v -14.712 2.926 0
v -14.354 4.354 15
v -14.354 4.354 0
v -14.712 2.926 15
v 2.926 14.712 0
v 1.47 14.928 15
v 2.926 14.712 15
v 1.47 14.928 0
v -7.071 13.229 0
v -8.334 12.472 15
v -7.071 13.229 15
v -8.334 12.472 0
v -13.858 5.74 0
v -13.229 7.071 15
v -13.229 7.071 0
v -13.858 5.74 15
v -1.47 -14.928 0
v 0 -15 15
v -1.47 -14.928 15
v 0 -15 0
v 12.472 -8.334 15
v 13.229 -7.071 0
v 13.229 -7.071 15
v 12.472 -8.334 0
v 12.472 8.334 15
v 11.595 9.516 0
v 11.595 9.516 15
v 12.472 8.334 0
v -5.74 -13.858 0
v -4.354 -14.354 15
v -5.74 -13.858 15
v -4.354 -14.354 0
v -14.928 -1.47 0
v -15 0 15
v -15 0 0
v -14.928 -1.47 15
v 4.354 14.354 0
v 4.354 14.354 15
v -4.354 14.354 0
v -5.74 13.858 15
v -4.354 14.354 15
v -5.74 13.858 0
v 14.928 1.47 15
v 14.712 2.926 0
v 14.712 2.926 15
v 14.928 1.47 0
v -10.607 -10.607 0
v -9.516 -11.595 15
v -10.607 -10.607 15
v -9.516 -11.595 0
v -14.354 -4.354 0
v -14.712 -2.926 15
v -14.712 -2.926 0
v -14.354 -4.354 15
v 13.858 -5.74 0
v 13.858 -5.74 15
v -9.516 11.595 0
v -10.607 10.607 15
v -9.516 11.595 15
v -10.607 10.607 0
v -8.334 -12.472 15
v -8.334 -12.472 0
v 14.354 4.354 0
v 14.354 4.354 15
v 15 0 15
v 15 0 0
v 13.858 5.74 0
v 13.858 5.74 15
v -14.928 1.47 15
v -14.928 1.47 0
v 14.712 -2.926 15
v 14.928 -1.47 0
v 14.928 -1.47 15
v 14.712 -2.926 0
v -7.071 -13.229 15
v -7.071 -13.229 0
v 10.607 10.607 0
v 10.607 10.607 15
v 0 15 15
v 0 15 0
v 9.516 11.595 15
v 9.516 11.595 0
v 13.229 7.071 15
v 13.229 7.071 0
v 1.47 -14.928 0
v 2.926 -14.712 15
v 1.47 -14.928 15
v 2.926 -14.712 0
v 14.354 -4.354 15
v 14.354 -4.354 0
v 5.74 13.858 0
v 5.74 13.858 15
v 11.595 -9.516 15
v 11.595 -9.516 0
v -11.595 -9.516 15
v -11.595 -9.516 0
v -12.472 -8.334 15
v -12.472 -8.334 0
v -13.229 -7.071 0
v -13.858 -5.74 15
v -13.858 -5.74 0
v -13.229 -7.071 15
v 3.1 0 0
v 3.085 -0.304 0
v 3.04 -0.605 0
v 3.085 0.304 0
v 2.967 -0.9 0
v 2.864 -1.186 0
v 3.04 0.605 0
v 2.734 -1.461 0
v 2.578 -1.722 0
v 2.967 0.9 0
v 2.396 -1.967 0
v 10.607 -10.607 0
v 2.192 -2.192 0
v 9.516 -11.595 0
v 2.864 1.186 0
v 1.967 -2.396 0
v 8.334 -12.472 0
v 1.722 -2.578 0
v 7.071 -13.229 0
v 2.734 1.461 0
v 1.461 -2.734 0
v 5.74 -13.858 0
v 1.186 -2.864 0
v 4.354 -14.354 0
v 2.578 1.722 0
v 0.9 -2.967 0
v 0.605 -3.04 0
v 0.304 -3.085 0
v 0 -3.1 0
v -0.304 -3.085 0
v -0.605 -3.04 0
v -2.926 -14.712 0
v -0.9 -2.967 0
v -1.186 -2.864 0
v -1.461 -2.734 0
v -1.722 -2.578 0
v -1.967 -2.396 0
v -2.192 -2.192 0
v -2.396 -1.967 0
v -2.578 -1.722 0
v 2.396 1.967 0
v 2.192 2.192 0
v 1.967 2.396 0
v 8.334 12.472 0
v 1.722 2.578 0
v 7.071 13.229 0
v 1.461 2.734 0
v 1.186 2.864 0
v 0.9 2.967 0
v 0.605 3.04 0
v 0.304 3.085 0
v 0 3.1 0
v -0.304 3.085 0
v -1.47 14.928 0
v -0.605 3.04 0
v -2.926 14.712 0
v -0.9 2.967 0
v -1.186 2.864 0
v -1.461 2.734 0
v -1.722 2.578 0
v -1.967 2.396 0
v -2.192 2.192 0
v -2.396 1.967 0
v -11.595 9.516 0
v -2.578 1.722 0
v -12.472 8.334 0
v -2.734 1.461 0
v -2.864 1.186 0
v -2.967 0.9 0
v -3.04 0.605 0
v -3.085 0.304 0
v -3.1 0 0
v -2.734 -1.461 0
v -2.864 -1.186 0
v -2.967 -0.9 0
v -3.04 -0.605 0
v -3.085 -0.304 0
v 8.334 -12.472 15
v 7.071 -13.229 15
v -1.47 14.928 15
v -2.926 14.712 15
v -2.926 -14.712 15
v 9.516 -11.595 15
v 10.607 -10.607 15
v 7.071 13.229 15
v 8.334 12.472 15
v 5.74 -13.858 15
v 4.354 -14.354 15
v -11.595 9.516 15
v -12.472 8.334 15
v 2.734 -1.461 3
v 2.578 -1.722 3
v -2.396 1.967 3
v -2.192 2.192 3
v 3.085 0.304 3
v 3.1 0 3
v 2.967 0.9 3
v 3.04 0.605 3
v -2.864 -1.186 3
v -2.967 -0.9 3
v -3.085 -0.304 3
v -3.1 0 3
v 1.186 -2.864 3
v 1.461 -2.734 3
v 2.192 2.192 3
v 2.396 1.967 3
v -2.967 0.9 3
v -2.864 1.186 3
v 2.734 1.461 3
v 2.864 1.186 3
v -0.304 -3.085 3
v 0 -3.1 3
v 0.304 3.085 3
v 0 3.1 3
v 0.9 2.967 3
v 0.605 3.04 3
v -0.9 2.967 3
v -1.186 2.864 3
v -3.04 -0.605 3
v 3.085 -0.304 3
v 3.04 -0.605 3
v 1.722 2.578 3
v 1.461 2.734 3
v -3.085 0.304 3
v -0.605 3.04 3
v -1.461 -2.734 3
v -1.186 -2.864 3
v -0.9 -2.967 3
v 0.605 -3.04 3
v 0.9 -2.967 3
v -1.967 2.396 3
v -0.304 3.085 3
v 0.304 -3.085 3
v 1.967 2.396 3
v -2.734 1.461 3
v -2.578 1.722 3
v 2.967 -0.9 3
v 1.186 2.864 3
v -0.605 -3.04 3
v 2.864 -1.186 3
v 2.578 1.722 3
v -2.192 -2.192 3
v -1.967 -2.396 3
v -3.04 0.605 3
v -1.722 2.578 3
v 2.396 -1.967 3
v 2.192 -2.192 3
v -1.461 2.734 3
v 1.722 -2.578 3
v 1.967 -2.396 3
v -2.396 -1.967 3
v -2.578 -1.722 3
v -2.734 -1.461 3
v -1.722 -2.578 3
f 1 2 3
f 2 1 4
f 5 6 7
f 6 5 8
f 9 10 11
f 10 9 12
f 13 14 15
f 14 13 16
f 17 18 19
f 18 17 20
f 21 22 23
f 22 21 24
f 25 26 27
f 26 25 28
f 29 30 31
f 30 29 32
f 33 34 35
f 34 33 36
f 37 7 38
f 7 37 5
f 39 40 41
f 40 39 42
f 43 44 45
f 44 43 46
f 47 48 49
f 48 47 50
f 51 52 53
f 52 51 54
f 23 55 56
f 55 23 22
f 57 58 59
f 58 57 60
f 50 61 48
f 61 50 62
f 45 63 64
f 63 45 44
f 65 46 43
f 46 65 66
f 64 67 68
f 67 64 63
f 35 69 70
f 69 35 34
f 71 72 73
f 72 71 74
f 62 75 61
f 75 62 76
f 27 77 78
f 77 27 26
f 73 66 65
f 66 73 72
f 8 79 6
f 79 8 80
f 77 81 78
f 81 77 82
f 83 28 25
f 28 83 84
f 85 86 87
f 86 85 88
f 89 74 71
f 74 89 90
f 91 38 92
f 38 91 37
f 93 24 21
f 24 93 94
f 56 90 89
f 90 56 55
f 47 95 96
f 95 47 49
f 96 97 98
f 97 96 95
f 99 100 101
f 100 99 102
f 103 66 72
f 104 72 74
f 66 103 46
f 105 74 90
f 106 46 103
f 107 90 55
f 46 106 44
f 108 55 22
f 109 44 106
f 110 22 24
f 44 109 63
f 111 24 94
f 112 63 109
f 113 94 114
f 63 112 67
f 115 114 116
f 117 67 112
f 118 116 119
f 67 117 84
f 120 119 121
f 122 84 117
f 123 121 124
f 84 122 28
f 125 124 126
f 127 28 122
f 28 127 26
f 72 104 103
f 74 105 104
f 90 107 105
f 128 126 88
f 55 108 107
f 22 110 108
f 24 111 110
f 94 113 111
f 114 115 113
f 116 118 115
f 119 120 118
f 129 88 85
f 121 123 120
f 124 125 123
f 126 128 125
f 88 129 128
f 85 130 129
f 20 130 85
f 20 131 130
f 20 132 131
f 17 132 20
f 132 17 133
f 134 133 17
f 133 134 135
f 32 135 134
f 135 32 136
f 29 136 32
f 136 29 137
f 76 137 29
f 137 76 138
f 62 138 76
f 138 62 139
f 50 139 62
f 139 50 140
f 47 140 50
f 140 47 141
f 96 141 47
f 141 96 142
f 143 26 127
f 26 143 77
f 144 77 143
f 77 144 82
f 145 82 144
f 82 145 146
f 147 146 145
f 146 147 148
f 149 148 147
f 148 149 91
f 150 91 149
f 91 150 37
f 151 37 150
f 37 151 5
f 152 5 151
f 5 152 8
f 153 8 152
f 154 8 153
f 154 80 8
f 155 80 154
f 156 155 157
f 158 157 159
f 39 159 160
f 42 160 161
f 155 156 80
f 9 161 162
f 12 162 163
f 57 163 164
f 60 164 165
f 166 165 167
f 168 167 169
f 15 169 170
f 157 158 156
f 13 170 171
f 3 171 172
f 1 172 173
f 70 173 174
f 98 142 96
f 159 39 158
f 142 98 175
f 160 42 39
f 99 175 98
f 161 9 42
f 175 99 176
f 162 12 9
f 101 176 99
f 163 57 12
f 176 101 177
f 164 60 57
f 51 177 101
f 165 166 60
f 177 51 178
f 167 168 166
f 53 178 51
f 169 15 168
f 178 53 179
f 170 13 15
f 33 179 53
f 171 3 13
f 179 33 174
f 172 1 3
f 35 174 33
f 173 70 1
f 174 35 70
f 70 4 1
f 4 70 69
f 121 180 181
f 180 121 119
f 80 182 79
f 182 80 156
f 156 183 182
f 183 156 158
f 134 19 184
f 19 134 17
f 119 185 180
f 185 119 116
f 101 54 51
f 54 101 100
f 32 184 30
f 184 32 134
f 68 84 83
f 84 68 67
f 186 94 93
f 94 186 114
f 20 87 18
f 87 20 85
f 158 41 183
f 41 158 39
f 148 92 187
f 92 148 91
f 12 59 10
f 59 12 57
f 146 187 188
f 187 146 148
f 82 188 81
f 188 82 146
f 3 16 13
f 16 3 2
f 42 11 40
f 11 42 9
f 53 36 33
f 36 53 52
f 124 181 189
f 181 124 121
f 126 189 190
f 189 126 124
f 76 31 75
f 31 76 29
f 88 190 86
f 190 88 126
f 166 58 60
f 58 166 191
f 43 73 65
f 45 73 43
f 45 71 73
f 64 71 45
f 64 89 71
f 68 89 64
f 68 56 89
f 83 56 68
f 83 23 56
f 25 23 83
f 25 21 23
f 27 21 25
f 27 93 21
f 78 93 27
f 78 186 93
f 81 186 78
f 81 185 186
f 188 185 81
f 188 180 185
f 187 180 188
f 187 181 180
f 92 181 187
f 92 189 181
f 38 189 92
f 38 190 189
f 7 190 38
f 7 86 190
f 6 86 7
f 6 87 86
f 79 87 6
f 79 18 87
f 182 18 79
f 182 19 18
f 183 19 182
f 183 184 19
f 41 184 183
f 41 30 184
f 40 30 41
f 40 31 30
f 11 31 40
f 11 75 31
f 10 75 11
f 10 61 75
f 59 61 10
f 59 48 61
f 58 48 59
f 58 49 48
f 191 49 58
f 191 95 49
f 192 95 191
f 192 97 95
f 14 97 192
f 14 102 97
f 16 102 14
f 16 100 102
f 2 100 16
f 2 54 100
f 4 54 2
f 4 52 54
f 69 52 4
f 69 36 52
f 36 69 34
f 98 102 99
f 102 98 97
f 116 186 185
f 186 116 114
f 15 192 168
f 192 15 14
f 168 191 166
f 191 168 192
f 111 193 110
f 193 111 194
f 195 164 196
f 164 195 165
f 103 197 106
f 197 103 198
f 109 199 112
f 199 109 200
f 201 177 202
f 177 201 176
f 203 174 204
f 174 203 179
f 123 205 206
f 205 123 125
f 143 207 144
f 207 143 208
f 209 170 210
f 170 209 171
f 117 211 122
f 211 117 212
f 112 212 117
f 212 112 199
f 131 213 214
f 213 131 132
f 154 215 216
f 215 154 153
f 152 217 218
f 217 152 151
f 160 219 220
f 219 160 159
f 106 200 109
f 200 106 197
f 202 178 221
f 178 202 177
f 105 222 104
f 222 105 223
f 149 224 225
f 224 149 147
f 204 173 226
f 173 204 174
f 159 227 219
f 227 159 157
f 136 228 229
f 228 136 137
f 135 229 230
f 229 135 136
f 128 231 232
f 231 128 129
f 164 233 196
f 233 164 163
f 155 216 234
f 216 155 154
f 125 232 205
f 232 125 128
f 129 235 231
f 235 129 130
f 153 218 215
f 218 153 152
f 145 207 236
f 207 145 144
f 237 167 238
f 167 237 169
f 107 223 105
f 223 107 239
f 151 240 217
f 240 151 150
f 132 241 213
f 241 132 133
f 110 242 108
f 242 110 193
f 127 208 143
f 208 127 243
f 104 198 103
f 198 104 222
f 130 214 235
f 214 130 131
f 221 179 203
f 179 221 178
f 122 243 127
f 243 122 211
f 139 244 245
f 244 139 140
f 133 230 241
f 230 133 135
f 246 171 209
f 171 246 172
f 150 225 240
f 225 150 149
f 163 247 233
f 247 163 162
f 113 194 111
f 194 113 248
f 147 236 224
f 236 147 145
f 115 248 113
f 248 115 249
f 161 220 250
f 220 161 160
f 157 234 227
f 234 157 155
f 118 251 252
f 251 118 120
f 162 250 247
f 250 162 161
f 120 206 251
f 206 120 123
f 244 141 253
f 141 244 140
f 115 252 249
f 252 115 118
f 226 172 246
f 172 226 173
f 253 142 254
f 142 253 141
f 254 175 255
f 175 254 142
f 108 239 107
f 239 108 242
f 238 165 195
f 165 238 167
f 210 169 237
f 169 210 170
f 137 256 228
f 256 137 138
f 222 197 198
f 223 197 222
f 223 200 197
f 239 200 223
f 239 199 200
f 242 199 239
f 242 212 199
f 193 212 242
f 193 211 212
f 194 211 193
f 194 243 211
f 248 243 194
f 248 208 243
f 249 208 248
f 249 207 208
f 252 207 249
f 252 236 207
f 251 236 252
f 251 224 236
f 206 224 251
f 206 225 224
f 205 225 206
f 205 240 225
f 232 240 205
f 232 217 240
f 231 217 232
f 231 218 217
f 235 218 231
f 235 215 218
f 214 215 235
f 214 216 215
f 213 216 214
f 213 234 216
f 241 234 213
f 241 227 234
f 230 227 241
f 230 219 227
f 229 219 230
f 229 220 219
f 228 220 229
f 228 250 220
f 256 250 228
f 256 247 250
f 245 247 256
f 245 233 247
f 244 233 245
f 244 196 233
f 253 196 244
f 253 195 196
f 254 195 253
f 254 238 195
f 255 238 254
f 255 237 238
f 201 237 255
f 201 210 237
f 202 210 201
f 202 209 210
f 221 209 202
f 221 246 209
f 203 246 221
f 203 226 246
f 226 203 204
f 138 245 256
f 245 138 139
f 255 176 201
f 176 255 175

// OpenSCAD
// Replacement knob for a hotplate stirrer - a cylinder with a D-shaped blind bore and a
// pointer groove, and with a ring of grip grooves around the outside. NOVEL general part.
//

bottom_d = 30;
height   = 15;
shaft_d  = 6.2;
flat     = 4.7;
grooves  = 18;
pointer  = 1.5;

$fn = 64;

difference() {
    cylinder(h = height, d = bottom_d);
    translate([0, 0, 0])
        cylinder(h = height - 12, d = shaft_d, $fn = 64);                 // round bore
    translate([0, 0, 0])
        cylinder(h = height - 12, d = shaft_d, $fn = 32);                 // flat bore
    for (i = [0 : grooves - 1])
        rotate([0, 90, i * 360 / grooves])
            translate([bottom_d / 2, 0, 0])
                cylinder(h = height, d = 2, $fn = 16);                    // grip grooves
    translate([0, 0, height - 1])
        circle(d = bottom_d);                                             // cap the top
    translate([0, 0, height - 1])
        difference() {
            circle(d = bottom_d);
            circle(d = bottom_d - 2 * pointer);
        }                                                                 // pointer groove
}
